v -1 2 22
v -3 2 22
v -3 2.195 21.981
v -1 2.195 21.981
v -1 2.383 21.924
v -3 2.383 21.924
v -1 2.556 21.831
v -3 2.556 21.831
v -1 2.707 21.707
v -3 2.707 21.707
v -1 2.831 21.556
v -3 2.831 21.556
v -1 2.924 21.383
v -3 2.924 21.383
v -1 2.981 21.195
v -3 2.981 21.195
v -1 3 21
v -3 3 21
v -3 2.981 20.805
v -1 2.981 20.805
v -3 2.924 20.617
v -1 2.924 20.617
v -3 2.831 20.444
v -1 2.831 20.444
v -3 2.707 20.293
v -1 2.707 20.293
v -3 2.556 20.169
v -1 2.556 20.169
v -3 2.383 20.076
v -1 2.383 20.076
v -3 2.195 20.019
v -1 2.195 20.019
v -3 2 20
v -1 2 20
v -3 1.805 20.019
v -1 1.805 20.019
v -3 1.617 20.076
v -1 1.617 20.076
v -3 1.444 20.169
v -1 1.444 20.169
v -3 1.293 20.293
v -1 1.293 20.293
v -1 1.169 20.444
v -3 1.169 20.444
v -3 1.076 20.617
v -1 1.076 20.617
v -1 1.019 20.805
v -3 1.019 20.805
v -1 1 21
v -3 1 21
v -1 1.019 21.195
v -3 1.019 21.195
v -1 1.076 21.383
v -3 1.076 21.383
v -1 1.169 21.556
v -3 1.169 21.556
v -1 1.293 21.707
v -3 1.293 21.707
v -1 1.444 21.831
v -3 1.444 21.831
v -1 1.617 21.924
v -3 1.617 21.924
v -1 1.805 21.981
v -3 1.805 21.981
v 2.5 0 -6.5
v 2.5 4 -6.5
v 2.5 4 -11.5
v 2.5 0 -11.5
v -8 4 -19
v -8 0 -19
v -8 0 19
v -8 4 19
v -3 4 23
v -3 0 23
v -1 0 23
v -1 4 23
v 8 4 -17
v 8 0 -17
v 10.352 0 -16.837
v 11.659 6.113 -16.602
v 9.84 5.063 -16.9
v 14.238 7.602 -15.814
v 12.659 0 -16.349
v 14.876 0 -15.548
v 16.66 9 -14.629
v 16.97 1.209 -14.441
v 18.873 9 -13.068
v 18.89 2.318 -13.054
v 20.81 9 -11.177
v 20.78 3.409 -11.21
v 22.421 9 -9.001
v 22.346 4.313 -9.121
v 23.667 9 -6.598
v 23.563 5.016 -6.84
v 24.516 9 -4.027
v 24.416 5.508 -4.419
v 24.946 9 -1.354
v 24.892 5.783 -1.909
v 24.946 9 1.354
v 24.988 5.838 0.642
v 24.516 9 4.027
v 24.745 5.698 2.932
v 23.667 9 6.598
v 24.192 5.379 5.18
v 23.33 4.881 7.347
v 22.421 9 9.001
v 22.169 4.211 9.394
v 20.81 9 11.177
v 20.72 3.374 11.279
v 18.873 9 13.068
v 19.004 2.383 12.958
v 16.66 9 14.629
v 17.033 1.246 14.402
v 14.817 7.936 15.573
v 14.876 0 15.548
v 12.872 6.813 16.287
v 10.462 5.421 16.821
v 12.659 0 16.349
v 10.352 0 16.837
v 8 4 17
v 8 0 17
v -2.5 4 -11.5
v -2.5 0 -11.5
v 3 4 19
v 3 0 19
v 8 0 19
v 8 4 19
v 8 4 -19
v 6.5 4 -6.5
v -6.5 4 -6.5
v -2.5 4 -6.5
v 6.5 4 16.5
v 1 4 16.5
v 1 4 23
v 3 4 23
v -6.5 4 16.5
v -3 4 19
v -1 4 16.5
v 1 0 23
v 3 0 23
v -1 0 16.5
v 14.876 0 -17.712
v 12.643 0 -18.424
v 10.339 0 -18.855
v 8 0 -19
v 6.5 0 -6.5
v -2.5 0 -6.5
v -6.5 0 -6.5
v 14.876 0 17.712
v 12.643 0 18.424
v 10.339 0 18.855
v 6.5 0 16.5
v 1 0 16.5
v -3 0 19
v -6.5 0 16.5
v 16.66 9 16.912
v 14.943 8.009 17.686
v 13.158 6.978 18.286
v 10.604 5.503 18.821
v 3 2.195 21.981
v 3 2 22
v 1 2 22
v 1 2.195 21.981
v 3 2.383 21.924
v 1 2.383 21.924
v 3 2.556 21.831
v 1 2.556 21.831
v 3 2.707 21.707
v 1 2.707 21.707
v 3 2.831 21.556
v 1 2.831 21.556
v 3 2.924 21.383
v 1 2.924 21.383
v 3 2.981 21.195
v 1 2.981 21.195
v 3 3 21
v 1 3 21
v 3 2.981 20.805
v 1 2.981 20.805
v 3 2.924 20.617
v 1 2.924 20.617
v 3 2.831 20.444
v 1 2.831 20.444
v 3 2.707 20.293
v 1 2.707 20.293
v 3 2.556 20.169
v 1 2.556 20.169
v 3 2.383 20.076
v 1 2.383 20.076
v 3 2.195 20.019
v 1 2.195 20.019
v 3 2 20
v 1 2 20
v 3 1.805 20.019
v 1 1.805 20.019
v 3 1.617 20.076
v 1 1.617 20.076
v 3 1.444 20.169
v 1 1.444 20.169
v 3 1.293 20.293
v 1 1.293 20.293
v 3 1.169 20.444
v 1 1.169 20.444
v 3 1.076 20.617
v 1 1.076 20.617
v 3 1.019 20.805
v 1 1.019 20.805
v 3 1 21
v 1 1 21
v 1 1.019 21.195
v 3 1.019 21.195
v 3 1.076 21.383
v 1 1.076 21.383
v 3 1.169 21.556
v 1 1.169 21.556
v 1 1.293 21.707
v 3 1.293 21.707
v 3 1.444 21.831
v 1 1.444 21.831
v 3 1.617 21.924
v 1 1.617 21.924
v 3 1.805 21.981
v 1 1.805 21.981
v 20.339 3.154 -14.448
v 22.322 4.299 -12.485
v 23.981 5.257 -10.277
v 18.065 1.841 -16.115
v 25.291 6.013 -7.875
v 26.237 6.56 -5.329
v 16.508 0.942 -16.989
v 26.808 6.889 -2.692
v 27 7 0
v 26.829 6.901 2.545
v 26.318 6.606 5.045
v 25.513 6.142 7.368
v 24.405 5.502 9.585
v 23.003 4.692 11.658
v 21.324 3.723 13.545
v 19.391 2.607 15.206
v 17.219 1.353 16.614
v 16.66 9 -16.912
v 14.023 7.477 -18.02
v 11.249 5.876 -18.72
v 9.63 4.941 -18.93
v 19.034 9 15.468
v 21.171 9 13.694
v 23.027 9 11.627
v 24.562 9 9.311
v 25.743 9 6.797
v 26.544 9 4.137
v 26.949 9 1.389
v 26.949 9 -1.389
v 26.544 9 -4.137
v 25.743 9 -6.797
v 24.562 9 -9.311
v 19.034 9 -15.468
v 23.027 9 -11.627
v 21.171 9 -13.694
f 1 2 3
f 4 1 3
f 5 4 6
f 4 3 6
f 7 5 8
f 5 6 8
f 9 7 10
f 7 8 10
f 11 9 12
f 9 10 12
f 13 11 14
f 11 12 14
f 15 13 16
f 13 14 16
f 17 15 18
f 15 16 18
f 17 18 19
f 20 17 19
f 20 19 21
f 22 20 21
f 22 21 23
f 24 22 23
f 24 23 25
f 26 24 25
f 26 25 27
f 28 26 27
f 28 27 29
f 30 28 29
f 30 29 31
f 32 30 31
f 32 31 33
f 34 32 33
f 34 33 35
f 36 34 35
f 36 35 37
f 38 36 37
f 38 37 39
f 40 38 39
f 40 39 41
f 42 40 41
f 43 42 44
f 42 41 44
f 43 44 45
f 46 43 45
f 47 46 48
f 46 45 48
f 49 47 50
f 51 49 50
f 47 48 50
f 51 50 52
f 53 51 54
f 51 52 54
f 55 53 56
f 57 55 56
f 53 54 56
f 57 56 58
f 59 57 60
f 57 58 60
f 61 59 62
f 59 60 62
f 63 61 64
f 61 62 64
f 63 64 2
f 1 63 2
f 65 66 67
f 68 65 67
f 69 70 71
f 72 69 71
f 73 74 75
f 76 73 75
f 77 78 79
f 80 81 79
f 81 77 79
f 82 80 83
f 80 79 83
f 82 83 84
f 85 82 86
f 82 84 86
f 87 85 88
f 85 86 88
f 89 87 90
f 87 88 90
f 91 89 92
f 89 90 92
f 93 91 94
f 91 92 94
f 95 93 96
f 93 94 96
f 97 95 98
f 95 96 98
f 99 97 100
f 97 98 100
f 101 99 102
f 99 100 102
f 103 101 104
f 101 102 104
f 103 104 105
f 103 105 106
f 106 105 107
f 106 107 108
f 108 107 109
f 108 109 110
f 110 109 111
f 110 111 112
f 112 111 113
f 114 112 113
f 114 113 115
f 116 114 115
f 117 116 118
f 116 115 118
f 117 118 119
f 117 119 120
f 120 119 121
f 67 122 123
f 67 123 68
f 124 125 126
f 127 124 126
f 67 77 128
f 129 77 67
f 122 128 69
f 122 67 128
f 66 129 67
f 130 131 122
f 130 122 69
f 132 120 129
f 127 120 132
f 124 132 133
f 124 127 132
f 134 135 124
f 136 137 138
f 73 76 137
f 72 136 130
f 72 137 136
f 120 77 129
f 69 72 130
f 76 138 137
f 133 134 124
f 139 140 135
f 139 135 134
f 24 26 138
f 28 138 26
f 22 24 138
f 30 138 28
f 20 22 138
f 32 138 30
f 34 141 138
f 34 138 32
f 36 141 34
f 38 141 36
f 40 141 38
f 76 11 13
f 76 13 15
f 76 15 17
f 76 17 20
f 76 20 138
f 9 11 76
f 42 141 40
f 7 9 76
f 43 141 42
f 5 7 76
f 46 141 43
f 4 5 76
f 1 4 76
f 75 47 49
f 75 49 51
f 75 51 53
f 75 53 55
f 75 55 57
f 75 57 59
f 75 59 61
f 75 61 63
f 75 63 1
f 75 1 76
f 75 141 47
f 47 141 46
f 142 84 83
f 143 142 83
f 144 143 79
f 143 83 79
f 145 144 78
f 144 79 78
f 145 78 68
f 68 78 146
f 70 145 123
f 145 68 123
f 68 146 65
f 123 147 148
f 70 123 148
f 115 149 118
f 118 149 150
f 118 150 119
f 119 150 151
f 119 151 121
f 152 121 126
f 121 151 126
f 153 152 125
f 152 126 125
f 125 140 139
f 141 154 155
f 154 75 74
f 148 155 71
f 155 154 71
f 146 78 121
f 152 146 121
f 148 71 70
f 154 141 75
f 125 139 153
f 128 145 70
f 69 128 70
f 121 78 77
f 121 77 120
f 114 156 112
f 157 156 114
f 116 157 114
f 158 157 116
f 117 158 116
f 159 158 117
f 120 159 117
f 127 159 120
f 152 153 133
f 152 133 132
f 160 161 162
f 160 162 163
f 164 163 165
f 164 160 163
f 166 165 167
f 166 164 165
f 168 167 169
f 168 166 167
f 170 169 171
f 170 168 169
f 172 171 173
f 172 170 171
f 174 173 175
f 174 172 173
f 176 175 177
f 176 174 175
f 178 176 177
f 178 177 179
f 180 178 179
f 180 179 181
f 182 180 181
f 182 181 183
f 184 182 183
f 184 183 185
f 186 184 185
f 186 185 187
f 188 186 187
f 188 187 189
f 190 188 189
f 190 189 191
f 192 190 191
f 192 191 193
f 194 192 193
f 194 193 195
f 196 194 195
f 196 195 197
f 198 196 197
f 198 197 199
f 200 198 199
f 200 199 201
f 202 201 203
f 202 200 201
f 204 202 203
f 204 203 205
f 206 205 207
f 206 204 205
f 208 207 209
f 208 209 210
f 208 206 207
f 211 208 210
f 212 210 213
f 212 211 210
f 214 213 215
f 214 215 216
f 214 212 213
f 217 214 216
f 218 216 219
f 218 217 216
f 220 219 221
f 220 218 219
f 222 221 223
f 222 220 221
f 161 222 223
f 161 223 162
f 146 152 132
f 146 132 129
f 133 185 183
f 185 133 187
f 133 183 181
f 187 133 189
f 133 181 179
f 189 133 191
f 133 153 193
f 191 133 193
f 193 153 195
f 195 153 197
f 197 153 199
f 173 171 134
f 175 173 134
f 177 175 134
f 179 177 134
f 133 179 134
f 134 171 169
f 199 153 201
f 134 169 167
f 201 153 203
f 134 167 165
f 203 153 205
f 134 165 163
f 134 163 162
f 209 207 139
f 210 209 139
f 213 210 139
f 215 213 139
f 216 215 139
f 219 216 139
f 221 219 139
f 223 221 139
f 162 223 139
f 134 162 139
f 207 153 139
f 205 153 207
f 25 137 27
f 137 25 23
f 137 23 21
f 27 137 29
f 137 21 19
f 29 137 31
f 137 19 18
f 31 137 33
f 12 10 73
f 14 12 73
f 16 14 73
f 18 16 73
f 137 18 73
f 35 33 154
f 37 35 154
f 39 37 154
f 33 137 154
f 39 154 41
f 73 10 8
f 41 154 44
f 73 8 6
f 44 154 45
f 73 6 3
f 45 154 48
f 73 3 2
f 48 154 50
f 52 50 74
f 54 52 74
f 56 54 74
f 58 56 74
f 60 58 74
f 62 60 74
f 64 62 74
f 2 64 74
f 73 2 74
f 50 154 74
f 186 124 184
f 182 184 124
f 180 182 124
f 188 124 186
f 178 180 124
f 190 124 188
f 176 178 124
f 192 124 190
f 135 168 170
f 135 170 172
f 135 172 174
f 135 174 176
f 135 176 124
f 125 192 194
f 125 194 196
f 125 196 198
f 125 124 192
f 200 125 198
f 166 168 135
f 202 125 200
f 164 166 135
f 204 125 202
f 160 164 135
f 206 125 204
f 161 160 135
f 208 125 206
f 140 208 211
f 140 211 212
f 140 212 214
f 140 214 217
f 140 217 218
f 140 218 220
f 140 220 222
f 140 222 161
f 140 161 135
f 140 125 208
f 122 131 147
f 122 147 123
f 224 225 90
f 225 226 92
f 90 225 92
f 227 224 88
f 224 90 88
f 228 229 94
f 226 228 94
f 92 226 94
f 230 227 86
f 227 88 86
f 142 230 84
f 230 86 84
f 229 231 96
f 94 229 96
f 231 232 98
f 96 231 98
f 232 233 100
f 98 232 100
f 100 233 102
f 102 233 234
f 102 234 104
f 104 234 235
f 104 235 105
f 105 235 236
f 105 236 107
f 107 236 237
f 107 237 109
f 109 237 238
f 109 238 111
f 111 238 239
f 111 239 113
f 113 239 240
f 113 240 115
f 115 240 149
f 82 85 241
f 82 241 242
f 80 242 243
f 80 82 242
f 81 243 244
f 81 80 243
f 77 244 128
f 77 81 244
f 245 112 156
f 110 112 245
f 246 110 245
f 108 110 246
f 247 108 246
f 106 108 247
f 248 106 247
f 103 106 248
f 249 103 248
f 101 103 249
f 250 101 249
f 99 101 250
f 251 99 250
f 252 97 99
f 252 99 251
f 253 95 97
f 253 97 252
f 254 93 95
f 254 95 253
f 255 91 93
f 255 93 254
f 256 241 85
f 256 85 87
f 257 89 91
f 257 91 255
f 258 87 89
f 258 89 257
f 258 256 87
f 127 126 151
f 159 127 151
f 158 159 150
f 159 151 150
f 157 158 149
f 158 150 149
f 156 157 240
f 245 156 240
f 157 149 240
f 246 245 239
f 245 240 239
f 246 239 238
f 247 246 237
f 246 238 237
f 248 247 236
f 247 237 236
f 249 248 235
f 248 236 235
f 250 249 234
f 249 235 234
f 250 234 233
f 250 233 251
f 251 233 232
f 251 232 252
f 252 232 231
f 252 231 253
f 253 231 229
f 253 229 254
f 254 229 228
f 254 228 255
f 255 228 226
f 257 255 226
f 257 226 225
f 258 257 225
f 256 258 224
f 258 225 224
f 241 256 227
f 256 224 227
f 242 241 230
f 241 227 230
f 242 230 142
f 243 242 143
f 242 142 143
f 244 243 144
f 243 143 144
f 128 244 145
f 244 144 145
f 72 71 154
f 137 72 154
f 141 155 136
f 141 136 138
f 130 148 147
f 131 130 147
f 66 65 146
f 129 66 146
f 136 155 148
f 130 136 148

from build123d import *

# Parameters (mm, degrees)
SKETCH1_W           = 13
SKETCH1_H           = 23
BOSS_EXTRUDE1_DEPTH = 4
BOSS_EXTRUDE2_DEPTH = 5
CUT_EXTRUDE1_REACH  = 49.476
CUT_EXTRUDE2_REACH  = 35.392
SKETCH4_W           = 5
SKETCH4_H           = 5
SKETCH4_W_2         = 2
SKETCH4_H_2         = 2.5
SKETCH5_W           = 2
SKETCH5_H           = 4
BOSS_EXTRUDE3_DEPTH = 4
CUT_EXTRUDE3_REACH  = 40.859
SKETCH6_R           = 1


with BuildPart() as part:
    # Sketch1 → Boss-Extrude1 (new body)
    with BuildSketch(Plane(origin=(0, 0, 0), x_dir=(1, 0, 0), z_dir=(0, 1, 0))):
        with BuildLine():
            Line((-8, -19), (8, -19))
            ThreePointArc((8, -19), (27, 0), (8, 19))
            Line((8, 19), (-8, 19))
            Line((-8, 19), (-8, -19))
        make_face()
        with BuildLine():
            Line((8, 17), (8, -17))
            ThreePointArc((8, -17), (25, 0), (8, 17))
        make_face(mode=Mode.SUBTRACT)
        with Locations((0, -5)):
            Rectangle(SKETCH1_W, SKETCH1_H, mode=Mode.SUBTRACT)
    extrude(amount=BOSS_EXTRUDE1_DEPTH)

    # Sketch2 → Boss-Extrude2 (add)
    with BuildSketch(Plane(origin=(0, 4, 0), x_dir=(1, 0, 0), z_dir=(0, 1, 0))):
        with BuildLine():
            Line((8, 19), (8, 17))
            ThreePointArc((8, 17), (25, 0), (8, -17))
            Line((8, -17), (8, -19))
            ThreePointArc((8, -19), (27, 0), (8, 19))
        make_face()
    extrude(amount=BOSS_EXTRUDE2_DEPTH)

    # Cut-Extrude1: up to this face of the body (flat: up to its plane)
    cut_extrude1_end = Plane(part.part.faces().sort_by_distance((0, 2, -19))[0])
    # Sketch3 → Cut-Extrude1 (cut, up to the picked face)
    with BuildSketch(Plane.XY.offset(19), mode=Mode.PRIVATE) as cut_extrude1_sk1:
        Polygon((8, 4), (8, 9), (16.660254038, 9), align=None)
    cut_extrude1_tool1 = split(extrude(cut_extrude1_sk1.sketch, amount=-CUT_EXTRUDE1_REACH, mode=Mode.PRIVATE), bisect_by=cut_extrude1_end, keep=Keep.BOTH, mode=Mode.PRIVATE)
    # Sketch3 → Cut-Extrude1 (cut, up to the picked face)
    with BuildSketch(Plane.XY.offset(19), mode=Mode.PRIVATE) as cut_extrude1_sk2:
        Polygon((27, 7), (14.875644347, 0), (27, 0), align=None)
    cut_extrude1_tool2 = split(extrude(cut_extrude1_sk2.sketch, amount=-CUT_EXTRUDE1_REACH, mode=Mode.PRIVATE), bisect_by=cut_extrude1_end, keep=Keep.BOTH, mode=Mode.PRIVATE)
    add(cut_extrude1_tool1.solids().sort_by(Axis((10.886751, 7.333333, 19), (0, 0, -1)))[0], mode=Mode.SUBTRACT)
    add(cut_extrude1_tool2.solids().sort_by(Axis((22.958548, 2.333333, 19), (0, 0, -1)))[0], mode=Mode.SUBTRACT)

    # Sketch4 → Cut-Extrude2 (cut, up to next)
    with BuildSketch(Plane(origin=(0, 4, 0), x_dir=(1, 0, 0), z_dir=(0, 1, 0)), mode=Mode.PRIVATE) as cut_extrude2_sk1:
        with Locations((0, 9)):
            Rectangle(SKETCH4_W, SKETCH4_H)
    cut_extrude2_tool1 = extrude(cut_extrude2_sk1.sketch, amount=-CUT_EXTRUDE2_REACH, mode=Mode.PRIVATE) & part.part
    # Sketch4 → Cut-Extrude2 (cut, up to next)
    with BuildSketch(Plane(origin=(0, 4, 0), x_dir=(1, 0, 0), z_dir=(0, 1, 0)), mode=Mode.PRIVATE) as cut_extrude2_sk2:
        with Locations((0, -17.75)):
            Rectangle(SKETCH4_W_2, SKETCH4_H_2)
    cut_extrude2_tool2 = extrude(cut_extrude2_sk2.sketch, amount=-CUT_EXTRUDE2_REACH, mode=Mode.PRIVATE) & part.part
    add(cut_extrude2_tool1.solids().sort_by_distance((0, 4, -9))[0], mode=Mode.SUBTRACT)
    add(cut_extrude2_tool2.solids().sort_by_distance((0, 4, 17.75))[0], mode=Mode.SUBTRACT)

    # Sketch5 → Boss-Extrude3 (add)
    with BuildSketch(Plane.XZ):
        with Locations((-2, 21)):
            Rectangle(SKETCH5_W, SKETCH5_H)
    boss_extrude3 = extrude(amount=-BOSS_EXTRUDE3_DEPTH)

    # Sketch6 → Cut-Extrude3 (cut, up to next)
    with BuildSketch(Plane.ZY.offset(3), mode=Mode.PRIVATE) as cut_extrude3_sk1:
        with Locations((21, 2)):
            Circle(SKETCH6_R)
    cut_extrude3_tool1 = extrude(cut_extrude3_sk1.sketch, amount=-CUT_EXTRUDE3_REACH, mode=Mode.PRIVATE) & part.part
    cut_extrude3 = cut_extrude3_tool1.solids().sort_by_distance((-3, 2, 21))[0]
    add(cut_extrude3, mode=Mode.SUBTRACT)

    # Mirror1: Boss-Extrude3, Cut-Extrude3 across plane
    add(boss_extrude3.mirror(Plane(origin=(0, 0, 0), x_dir=(0, 0, 1), z_dir=(1, 0, 0))))
    add(cut_extrude3.mirror(Plane(origin=(0, 0, 0), x_dir=(0, 0, 1), z_dir=(1, 0, 0))), mode=Mode.SUBTRACT)


solid = part.part
